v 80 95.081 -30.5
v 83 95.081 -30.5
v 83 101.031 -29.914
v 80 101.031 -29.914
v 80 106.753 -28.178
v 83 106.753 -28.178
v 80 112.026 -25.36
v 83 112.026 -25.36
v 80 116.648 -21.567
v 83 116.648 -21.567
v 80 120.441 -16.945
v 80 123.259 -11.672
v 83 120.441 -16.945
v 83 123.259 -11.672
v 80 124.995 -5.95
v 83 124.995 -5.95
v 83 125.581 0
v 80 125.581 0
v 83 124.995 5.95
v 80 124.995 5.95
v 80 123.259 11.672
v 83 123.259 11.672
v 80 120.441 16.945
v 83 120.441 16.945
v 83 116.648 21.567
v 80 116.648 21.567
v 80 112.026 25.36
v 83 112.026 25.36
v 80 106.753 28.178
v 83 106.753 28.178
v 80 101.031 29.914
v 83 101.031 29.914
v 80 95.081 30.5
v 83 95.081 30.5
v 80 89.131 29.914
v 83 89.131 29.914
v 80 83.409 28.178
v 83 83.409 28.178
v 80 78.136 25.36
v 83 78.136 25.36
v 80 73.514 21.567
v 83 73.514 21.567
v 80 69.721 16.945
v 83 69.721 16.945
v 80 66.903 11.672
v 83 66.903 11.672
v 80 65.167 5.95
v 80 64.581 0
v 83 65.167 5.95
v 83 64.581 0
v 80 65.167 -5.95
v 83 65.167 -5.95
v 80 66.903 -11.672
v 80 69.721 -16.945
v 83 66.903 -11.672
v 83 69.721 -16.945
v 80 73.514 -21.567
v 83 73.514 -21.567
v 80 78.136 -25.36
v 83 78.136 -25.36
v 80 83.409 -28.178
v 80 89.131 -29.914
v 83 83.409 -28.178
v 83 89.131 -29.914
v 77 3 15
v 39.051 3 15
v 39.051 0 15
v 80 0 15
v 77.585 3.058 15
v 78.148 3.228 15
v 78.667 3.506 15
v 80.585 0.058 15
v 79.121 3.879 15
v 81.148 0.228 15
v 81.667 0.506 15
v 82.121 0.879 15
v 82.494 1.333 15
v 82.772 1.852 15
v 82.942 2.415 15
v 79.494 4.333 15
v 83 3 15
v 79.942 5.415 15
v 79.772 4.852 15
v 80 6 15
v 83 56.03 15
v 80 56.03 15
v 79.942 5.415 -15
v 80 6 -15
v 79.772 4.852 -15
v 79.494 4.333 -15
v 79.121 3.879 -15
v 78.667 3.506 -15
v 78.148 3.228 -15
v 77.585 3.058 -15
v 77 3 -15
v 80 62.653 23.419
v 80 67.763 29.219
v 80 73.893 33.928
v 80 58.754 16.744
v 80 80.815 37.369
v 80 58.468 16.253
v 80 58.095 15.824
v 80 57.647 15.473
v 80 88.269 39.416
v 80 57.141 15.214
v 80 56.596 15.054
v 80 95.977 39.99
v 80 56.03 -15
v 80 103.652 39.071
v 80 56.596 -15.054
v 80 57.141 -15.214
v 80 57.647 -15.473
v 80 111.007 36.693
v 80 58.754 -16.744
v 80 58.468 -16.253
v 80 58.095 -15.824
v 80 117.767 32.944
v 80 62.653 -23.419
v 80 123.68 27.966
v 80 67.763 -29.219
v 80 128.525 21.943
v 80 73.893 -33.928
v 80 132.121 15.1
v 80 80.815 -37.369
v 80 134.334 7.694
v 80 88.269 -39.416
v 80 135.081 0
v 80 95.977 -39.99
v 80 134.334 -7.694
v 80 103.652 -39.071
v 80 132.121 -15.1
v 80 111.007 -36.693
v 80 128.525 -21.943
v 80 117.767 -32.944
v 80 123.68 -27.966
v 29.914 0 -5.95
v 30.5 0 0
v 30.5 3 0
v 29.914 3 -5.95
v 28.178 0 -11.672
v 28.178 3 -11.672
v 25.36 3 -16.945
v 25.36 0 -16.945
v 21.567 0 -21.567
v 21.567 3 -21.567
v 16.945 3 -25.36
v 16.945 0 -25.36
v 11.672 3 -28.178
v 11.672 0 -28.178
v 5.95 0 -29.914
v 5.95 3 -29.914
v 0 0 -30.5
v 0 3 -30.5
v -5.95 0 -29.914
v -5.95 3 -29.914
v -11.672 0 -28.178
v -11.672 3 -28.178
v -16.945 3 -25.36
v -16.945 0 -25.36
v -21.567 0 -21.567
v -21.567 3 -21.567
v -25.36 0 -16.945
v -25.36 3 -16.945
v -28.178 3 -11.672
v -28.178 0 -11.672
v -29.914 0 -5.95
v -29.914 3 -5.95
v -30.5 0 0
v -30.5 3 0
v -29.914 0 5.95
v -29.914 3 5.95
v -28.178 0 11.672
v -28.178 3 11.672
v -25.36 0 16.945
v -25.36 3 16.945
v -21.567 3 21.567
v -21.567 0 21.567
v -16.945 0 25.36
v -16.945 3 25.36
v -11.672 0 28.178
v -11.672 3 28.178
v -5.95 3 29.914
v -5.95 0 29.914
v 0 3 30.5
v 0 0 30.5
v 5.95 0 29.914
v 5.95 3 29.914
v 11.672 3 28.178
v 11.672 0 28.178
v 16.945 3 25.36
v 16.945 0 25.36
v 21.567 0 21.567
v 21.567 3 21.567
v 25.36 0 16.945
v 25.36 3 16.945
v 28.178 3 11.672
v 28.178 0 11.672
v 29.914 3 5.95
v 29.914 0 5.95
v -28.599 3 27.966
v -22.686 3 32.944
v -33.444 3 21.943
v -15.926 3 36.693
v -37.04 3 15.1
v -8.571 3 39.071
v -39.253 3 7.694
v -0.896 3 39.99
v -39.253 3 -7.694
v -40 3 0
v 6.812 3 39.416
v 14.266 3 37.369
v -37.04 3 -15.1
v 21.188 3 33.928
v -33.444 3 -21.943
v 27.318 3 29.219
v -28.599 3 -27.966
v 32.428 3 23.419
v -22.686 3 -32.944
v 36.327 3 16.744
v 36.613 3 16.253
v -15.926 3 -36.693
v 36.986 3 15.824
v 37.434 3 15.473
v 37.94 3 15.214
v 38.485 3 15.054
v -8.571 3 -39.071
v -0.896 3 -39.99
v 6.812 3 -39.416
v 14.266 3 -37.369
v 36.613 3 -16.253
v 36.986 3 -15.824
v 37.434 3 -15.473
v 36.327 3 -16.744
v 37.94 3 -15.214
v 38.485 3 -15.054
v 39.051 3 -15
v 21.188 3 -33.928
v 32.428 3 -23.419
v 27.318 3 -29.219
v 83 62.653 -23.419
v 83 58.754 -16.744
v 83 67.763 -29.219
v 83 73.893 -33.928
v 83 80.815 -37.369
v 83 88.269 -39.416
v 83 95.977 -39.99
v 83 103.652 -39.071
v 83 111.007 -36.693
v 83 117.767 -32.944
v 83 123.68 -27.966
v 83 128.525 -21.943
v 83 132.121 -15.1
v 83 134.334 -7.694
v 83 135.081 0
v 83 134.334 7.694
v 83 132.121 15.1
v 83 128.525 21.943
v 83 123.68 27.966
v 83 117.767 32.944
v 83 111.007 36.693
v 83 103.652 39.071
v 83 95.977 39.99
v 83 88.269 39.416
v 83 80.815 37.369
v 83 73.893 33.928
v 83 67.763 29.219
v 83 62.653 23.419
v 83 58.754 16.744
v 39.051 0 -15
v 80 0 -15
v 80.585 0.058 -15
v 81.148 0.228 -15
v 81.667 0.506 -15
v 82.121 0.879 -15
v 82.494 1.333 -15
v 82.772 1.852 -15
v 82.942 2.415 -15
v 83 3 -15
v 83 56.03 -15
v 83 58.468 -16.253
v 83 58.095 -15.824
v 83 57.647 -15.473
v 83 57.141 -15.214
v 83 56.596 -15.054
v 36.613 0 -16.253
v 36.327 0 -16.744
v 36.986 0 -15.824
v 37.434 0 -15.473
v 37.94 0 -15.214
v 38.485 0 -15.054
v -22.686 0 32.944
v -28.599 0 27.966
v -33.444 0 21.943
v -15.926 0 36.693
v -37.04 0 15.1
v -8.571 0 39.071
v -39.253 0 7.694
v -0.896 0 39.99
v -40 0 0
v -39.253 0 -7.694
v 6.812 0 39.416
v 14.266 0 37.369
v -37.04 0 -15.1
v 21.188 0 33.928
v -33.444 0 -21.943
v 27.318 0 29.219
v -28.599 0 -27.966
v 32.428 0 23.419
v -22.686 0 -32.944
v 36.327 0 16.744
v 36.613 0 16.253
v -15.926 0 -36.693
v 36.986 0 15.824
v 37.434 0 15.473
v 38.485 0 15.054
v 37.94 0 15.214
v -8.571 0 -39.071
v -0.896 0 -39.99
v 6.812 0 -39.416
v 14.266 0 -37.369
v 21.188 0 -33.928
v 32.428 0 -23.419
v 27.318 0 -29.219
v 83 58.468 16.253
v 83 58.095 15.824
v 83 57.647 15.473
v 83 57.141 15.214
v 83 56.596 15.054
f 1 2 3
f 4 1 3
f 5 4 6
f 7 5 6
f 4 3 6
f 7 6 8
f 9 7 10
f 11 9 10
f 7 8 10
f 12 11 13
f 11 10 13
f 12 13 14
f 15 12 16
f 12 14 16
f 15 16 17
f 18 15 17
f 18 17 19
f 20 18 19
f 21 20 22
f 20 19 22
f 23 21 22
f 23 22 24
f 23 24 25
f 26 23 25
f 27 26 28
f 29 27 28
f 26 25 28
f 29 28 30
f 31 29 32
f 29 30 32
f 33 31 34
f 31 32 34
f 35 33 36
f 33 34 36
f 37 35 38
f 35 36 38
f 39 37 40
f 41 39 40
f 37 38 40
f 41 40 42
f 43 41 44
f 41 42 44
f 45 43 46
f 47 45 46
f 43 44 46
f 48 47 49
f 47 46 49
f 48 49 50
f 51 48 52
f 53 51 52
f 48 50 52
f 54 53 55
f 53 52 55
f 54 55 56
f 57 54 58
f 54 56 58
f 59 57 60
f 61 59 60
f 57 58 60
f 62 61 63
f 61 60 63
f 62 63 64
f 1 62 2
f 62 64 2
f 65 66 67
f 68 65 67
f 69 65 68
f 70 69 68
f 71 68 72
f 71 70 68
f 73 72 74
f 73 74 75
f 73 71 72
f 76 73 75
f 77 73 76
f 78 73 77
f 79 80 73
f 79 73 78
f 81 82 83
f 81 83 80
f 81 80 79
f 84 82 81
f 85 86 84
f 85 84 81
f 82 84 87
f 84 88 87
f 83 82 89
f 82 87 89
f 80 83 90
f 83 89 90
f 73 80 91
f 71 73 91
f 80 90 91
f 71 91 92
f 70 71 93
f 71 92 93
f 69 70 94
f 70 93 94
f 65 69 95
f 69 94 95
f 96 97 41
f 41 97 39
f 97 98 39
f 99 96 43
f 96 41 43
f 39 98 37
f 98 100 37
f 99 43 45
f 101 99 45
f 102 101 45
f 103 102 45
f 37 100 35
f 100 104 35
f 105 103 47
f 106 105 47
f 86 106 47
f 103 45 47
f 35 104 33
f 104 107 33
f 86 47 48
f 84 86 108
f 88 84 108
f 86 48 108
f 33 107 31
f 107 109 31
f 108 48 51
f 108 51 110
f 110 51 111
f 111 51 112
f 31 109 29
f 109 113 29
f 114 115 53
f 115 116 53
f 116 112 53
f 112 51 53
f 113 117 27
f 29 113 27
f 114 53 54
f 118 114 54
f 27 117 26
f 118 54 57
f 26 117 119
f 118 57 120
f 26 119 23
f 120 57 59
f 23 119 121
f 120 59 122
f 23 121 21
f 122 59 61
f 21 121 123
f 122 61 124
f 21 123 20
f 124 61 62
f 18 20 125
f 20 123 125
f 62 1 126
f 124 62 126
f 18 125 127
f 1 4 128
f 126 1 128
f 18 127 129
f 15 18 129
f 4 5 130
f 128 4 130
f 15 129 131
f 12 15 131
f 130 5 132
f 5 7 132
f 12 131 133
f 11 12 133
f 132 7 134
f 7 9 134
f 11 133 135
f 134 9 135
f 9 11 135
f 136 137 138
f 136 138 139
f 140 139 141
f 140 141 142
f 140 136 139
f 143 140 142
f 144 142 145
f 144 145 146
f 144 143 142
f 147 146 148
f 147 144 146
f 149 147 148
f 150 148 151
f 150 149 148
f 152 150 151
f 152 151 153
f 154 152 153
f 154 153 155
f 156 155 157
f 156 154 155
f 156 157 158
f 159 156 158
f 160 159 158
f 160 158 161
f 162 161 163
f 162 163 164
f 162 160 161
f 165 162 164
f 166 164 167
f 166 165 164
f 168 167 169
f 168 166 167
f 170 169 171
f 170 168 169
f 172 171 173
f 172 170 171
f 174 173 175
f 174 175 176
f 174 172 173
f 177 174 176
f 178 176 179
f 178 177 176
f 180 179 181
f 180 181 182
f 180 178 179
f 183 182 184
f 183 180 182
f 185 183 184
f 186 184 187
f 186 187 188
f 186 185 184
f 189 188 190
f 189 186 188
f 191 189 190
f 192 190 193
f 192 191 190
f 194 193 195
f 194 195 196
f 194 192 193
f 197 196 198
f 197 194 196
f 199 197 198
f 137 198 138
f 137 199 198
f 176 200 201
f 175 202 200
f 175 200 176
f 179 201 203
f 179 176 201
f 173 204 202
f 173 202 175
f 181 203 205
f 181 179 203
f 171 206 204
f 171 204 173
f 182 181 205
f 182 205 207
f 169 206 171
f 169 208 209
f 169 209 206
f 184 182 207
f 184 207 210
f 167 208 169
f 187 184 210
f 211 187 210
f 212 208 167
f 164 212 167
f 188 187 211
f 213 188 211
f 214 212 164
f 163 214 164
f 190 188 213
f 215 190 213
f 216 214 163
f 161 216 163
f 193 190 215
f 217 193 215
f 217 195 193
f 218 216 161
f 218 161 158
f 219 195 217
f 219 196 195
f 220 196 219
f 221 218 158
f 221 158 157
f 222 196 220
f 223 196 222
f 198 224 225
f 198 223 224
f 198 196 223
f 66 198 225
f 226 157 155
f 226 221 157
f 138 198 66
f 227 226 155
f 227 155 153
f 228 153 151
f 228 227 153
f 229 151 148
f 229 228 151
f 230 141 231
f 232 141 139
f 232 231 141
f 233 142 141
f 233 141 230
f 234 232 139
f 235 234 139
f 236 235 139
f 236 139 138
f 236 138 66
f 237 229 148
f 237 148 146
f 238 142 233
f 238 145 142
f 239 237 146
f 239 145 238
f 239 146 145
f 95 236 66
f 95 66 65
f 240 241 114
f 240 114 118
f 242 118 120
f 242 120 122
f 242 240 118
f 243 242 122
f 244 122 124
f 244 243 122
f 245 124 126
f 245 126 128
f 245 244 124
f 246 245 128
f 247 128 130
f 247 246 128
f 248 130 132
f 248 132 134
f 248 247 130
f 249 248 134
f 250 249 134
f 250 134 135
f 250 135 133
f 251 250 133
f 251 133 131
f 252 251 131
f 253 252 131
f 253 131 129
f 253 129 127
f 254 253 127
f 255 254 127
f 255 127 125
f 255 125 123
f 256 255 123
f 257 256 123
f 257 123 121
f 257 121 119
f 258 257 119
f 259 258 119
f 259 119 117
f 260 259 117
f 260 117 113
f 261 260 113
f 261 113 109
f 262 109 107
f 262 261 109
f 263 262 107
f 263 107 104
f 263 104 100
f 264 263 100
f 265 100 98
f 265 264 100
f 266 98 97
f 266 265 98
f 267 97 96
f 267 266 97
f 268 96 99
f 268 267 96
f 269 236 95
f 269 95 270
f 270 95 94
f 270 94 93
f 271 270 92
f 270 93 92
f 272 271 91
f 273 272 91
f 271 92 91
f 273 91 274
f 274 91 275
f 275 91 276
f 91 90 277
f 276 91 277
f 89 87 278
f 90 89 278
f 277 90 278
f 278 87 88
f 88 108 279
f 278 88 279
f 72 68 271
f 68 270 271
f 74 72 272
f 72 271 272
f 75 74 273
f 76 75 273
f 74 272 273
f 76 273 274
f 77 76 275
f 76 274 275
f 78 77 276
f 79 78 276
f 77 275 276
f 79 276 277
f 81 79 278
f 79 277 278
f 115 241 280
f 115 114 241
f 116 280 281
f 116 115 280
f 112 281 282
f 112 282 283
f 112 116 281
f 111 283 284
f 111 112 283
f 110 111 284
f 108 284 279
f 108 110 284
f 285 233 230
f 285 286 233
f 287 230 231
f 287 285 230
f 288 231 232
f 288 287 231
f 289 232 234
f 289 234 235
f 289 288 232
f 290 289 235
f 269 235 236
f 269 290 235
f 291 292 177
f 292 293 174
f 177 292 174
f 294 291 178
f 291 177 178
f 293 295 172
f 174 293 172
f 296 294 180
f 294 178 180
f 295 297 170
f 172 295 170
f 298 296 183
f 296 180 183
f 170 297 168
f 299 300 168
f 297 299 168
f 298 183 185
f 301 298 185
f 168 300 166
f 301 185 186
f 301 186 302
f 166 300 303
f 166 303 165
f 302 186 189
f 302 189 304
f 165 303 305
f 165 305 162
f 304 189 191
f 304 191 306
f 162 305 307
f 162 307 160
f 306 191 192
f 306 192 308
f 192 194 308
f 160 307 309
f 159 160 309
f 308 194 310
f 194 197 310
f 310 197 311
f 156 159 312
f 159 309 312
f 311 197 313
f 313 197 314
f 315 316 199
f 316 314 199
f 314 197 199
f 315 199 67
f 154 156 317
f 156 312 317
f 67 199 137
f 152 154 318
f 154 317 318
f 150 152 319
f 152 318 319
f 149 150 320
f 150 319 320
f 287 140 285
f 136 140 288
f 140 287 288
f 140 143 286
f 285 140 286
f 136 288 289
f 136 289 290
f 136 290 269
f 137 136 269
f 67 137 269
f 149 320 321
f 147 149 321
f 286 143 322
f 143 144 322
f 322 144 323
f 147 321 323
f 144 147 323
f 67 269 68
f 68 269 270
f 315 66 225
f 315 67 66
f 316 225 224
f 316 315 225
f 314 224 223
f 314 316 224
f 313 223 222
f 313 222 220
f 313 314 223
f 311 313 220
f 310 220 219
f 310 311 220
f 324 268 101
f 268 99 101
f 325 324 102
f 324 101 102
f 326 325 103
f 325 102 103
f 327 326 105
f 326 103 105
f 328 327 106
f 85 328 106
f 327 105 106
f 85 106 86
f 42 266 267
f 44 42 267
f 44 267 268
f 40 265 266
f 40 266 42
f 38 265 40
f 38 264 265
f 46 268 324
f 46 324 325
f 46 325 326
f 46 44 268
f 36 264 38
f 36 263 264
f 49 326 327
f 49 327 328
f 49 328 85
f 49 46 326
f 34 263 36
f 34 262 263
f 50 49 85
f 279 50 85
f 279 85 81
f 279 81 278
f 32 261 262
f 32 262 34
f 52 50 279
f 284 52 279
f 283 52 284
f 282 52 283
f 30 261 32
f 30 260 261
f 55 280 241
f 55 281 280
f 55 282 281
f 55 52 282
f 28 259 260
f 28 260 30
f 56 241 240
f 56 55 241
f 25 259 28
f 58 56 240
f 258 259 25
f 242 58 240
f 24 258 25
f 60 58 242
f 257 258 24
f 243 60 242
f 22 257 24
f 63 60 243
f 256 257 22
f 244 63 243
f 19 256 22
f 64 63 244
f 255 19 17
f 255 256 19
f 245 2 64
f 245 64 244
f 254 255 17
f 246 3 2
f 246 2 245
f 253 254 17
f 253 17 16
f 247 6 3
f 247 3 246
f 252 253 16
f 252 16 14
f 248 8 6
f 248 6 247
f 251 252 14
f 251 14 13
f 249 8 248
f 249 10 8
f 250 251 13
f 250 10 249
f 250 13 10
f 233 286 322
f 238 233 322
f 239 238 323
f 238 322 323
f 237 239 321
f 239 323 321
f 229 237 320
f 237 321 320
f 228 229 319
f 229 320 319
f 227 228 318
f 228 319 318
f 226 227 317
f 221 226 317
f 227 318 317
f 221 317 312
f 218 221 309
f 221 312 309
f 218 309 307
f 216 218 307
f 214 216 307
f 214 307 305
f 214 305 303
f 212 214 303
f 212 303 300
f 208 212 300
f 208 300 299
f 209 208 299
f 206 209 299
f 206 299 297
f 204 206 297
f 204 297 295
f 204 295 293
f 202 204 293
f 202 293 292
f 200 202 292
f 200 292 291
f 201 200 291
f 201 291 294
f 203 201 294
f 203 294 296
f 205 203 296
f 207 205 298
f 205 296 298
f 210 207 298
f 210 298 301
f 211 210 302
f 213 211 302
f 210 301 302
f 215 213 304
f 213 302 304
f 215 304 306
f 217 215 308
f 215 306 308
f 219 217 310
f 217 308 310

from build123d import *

# Parameters (mm, degrees)
SKETCH1_R           = 40
SKETCH1_R_2         = 30.5
BOSS_EXTRUDE1_DEPTH = 3
SKETCH2_W           = 48
SKETCH2_H           = 30
BOSS_EXTRUDE2_DEPTH = 3
SKETCH3_R           = 30.5
BOSS_EXTRUDE3_DEPTH = 3
FILLET1_R           = 3
FILLET2_R           = 3


with BuildPart() as part:
    # Sketch1 → Boss-Extrude1 (new body)
    with BuildSketch(Plane(origin=(0, 0, 0), x_dir=(1, 0, 0), z_dir=(0, 1, 0))):
        Circle(SKETCH1_R)
        Circle(SKETCH1_R_2, mode=Mode.SUBTRACT)
    extrude(amount=BOSS_EXTRUDE1_DEPTH)

    # Sketch2 → Boss-Extrude2 (add)
    with BuildSketch(Plane(origin=(0, 3, 0), x_dir=(1, 0, 0), z_dir=(0, 1, 0))):
        with Locations((59, 0)):
            Rectangle(SKETCH2_W, SKETCH2_H)
    extrude(amount=-BOSS_EXTRUDE2_DEPTH)

    # Sketch3 → Boss-Extrude3 (add)
    with BuildSketch(Plane(origin=(83, 0, 0), x_dir=(0, 0, -1), z_dir=(1, 0, 0))):
        with BuildLine():
            Line((-15, 0), (15, 0))
            Line((15, 0), (15, 58))
            ThreePointArc((15, 58), (0, 135.080992435), (-15, 58))
            Line((-15, 58), (-15, 0))
        make_face()
        with Locations((0, 95.080992435)):
            Circle(SKETCH3_R, mode=Mode.SUBTRACT)
    extrude(amount=-BOSS_EXTRUDE3_DEPTH)

    # Fillet1
    fillet1_edges = [part.edges().sort_by_distance(p)[0] for p in [
        (37.080992435, 1.5, 15),
        (37.080992435, 1.5, -15),
        (81.5, 58, 15),
        (81.5, 58, -15),
    ]]
    fillet(fillet1_edges, radius=FILLET1_R)

    # Fillet2
    fillet2_edges = [part.edges().sort_by_distance(p)[0] for p in [
        (83, 0, 0),
        (80, 3, 0),
    ]]
    fillet(fillet2_edges, radius=FILLET2_R)


solid = part.part
